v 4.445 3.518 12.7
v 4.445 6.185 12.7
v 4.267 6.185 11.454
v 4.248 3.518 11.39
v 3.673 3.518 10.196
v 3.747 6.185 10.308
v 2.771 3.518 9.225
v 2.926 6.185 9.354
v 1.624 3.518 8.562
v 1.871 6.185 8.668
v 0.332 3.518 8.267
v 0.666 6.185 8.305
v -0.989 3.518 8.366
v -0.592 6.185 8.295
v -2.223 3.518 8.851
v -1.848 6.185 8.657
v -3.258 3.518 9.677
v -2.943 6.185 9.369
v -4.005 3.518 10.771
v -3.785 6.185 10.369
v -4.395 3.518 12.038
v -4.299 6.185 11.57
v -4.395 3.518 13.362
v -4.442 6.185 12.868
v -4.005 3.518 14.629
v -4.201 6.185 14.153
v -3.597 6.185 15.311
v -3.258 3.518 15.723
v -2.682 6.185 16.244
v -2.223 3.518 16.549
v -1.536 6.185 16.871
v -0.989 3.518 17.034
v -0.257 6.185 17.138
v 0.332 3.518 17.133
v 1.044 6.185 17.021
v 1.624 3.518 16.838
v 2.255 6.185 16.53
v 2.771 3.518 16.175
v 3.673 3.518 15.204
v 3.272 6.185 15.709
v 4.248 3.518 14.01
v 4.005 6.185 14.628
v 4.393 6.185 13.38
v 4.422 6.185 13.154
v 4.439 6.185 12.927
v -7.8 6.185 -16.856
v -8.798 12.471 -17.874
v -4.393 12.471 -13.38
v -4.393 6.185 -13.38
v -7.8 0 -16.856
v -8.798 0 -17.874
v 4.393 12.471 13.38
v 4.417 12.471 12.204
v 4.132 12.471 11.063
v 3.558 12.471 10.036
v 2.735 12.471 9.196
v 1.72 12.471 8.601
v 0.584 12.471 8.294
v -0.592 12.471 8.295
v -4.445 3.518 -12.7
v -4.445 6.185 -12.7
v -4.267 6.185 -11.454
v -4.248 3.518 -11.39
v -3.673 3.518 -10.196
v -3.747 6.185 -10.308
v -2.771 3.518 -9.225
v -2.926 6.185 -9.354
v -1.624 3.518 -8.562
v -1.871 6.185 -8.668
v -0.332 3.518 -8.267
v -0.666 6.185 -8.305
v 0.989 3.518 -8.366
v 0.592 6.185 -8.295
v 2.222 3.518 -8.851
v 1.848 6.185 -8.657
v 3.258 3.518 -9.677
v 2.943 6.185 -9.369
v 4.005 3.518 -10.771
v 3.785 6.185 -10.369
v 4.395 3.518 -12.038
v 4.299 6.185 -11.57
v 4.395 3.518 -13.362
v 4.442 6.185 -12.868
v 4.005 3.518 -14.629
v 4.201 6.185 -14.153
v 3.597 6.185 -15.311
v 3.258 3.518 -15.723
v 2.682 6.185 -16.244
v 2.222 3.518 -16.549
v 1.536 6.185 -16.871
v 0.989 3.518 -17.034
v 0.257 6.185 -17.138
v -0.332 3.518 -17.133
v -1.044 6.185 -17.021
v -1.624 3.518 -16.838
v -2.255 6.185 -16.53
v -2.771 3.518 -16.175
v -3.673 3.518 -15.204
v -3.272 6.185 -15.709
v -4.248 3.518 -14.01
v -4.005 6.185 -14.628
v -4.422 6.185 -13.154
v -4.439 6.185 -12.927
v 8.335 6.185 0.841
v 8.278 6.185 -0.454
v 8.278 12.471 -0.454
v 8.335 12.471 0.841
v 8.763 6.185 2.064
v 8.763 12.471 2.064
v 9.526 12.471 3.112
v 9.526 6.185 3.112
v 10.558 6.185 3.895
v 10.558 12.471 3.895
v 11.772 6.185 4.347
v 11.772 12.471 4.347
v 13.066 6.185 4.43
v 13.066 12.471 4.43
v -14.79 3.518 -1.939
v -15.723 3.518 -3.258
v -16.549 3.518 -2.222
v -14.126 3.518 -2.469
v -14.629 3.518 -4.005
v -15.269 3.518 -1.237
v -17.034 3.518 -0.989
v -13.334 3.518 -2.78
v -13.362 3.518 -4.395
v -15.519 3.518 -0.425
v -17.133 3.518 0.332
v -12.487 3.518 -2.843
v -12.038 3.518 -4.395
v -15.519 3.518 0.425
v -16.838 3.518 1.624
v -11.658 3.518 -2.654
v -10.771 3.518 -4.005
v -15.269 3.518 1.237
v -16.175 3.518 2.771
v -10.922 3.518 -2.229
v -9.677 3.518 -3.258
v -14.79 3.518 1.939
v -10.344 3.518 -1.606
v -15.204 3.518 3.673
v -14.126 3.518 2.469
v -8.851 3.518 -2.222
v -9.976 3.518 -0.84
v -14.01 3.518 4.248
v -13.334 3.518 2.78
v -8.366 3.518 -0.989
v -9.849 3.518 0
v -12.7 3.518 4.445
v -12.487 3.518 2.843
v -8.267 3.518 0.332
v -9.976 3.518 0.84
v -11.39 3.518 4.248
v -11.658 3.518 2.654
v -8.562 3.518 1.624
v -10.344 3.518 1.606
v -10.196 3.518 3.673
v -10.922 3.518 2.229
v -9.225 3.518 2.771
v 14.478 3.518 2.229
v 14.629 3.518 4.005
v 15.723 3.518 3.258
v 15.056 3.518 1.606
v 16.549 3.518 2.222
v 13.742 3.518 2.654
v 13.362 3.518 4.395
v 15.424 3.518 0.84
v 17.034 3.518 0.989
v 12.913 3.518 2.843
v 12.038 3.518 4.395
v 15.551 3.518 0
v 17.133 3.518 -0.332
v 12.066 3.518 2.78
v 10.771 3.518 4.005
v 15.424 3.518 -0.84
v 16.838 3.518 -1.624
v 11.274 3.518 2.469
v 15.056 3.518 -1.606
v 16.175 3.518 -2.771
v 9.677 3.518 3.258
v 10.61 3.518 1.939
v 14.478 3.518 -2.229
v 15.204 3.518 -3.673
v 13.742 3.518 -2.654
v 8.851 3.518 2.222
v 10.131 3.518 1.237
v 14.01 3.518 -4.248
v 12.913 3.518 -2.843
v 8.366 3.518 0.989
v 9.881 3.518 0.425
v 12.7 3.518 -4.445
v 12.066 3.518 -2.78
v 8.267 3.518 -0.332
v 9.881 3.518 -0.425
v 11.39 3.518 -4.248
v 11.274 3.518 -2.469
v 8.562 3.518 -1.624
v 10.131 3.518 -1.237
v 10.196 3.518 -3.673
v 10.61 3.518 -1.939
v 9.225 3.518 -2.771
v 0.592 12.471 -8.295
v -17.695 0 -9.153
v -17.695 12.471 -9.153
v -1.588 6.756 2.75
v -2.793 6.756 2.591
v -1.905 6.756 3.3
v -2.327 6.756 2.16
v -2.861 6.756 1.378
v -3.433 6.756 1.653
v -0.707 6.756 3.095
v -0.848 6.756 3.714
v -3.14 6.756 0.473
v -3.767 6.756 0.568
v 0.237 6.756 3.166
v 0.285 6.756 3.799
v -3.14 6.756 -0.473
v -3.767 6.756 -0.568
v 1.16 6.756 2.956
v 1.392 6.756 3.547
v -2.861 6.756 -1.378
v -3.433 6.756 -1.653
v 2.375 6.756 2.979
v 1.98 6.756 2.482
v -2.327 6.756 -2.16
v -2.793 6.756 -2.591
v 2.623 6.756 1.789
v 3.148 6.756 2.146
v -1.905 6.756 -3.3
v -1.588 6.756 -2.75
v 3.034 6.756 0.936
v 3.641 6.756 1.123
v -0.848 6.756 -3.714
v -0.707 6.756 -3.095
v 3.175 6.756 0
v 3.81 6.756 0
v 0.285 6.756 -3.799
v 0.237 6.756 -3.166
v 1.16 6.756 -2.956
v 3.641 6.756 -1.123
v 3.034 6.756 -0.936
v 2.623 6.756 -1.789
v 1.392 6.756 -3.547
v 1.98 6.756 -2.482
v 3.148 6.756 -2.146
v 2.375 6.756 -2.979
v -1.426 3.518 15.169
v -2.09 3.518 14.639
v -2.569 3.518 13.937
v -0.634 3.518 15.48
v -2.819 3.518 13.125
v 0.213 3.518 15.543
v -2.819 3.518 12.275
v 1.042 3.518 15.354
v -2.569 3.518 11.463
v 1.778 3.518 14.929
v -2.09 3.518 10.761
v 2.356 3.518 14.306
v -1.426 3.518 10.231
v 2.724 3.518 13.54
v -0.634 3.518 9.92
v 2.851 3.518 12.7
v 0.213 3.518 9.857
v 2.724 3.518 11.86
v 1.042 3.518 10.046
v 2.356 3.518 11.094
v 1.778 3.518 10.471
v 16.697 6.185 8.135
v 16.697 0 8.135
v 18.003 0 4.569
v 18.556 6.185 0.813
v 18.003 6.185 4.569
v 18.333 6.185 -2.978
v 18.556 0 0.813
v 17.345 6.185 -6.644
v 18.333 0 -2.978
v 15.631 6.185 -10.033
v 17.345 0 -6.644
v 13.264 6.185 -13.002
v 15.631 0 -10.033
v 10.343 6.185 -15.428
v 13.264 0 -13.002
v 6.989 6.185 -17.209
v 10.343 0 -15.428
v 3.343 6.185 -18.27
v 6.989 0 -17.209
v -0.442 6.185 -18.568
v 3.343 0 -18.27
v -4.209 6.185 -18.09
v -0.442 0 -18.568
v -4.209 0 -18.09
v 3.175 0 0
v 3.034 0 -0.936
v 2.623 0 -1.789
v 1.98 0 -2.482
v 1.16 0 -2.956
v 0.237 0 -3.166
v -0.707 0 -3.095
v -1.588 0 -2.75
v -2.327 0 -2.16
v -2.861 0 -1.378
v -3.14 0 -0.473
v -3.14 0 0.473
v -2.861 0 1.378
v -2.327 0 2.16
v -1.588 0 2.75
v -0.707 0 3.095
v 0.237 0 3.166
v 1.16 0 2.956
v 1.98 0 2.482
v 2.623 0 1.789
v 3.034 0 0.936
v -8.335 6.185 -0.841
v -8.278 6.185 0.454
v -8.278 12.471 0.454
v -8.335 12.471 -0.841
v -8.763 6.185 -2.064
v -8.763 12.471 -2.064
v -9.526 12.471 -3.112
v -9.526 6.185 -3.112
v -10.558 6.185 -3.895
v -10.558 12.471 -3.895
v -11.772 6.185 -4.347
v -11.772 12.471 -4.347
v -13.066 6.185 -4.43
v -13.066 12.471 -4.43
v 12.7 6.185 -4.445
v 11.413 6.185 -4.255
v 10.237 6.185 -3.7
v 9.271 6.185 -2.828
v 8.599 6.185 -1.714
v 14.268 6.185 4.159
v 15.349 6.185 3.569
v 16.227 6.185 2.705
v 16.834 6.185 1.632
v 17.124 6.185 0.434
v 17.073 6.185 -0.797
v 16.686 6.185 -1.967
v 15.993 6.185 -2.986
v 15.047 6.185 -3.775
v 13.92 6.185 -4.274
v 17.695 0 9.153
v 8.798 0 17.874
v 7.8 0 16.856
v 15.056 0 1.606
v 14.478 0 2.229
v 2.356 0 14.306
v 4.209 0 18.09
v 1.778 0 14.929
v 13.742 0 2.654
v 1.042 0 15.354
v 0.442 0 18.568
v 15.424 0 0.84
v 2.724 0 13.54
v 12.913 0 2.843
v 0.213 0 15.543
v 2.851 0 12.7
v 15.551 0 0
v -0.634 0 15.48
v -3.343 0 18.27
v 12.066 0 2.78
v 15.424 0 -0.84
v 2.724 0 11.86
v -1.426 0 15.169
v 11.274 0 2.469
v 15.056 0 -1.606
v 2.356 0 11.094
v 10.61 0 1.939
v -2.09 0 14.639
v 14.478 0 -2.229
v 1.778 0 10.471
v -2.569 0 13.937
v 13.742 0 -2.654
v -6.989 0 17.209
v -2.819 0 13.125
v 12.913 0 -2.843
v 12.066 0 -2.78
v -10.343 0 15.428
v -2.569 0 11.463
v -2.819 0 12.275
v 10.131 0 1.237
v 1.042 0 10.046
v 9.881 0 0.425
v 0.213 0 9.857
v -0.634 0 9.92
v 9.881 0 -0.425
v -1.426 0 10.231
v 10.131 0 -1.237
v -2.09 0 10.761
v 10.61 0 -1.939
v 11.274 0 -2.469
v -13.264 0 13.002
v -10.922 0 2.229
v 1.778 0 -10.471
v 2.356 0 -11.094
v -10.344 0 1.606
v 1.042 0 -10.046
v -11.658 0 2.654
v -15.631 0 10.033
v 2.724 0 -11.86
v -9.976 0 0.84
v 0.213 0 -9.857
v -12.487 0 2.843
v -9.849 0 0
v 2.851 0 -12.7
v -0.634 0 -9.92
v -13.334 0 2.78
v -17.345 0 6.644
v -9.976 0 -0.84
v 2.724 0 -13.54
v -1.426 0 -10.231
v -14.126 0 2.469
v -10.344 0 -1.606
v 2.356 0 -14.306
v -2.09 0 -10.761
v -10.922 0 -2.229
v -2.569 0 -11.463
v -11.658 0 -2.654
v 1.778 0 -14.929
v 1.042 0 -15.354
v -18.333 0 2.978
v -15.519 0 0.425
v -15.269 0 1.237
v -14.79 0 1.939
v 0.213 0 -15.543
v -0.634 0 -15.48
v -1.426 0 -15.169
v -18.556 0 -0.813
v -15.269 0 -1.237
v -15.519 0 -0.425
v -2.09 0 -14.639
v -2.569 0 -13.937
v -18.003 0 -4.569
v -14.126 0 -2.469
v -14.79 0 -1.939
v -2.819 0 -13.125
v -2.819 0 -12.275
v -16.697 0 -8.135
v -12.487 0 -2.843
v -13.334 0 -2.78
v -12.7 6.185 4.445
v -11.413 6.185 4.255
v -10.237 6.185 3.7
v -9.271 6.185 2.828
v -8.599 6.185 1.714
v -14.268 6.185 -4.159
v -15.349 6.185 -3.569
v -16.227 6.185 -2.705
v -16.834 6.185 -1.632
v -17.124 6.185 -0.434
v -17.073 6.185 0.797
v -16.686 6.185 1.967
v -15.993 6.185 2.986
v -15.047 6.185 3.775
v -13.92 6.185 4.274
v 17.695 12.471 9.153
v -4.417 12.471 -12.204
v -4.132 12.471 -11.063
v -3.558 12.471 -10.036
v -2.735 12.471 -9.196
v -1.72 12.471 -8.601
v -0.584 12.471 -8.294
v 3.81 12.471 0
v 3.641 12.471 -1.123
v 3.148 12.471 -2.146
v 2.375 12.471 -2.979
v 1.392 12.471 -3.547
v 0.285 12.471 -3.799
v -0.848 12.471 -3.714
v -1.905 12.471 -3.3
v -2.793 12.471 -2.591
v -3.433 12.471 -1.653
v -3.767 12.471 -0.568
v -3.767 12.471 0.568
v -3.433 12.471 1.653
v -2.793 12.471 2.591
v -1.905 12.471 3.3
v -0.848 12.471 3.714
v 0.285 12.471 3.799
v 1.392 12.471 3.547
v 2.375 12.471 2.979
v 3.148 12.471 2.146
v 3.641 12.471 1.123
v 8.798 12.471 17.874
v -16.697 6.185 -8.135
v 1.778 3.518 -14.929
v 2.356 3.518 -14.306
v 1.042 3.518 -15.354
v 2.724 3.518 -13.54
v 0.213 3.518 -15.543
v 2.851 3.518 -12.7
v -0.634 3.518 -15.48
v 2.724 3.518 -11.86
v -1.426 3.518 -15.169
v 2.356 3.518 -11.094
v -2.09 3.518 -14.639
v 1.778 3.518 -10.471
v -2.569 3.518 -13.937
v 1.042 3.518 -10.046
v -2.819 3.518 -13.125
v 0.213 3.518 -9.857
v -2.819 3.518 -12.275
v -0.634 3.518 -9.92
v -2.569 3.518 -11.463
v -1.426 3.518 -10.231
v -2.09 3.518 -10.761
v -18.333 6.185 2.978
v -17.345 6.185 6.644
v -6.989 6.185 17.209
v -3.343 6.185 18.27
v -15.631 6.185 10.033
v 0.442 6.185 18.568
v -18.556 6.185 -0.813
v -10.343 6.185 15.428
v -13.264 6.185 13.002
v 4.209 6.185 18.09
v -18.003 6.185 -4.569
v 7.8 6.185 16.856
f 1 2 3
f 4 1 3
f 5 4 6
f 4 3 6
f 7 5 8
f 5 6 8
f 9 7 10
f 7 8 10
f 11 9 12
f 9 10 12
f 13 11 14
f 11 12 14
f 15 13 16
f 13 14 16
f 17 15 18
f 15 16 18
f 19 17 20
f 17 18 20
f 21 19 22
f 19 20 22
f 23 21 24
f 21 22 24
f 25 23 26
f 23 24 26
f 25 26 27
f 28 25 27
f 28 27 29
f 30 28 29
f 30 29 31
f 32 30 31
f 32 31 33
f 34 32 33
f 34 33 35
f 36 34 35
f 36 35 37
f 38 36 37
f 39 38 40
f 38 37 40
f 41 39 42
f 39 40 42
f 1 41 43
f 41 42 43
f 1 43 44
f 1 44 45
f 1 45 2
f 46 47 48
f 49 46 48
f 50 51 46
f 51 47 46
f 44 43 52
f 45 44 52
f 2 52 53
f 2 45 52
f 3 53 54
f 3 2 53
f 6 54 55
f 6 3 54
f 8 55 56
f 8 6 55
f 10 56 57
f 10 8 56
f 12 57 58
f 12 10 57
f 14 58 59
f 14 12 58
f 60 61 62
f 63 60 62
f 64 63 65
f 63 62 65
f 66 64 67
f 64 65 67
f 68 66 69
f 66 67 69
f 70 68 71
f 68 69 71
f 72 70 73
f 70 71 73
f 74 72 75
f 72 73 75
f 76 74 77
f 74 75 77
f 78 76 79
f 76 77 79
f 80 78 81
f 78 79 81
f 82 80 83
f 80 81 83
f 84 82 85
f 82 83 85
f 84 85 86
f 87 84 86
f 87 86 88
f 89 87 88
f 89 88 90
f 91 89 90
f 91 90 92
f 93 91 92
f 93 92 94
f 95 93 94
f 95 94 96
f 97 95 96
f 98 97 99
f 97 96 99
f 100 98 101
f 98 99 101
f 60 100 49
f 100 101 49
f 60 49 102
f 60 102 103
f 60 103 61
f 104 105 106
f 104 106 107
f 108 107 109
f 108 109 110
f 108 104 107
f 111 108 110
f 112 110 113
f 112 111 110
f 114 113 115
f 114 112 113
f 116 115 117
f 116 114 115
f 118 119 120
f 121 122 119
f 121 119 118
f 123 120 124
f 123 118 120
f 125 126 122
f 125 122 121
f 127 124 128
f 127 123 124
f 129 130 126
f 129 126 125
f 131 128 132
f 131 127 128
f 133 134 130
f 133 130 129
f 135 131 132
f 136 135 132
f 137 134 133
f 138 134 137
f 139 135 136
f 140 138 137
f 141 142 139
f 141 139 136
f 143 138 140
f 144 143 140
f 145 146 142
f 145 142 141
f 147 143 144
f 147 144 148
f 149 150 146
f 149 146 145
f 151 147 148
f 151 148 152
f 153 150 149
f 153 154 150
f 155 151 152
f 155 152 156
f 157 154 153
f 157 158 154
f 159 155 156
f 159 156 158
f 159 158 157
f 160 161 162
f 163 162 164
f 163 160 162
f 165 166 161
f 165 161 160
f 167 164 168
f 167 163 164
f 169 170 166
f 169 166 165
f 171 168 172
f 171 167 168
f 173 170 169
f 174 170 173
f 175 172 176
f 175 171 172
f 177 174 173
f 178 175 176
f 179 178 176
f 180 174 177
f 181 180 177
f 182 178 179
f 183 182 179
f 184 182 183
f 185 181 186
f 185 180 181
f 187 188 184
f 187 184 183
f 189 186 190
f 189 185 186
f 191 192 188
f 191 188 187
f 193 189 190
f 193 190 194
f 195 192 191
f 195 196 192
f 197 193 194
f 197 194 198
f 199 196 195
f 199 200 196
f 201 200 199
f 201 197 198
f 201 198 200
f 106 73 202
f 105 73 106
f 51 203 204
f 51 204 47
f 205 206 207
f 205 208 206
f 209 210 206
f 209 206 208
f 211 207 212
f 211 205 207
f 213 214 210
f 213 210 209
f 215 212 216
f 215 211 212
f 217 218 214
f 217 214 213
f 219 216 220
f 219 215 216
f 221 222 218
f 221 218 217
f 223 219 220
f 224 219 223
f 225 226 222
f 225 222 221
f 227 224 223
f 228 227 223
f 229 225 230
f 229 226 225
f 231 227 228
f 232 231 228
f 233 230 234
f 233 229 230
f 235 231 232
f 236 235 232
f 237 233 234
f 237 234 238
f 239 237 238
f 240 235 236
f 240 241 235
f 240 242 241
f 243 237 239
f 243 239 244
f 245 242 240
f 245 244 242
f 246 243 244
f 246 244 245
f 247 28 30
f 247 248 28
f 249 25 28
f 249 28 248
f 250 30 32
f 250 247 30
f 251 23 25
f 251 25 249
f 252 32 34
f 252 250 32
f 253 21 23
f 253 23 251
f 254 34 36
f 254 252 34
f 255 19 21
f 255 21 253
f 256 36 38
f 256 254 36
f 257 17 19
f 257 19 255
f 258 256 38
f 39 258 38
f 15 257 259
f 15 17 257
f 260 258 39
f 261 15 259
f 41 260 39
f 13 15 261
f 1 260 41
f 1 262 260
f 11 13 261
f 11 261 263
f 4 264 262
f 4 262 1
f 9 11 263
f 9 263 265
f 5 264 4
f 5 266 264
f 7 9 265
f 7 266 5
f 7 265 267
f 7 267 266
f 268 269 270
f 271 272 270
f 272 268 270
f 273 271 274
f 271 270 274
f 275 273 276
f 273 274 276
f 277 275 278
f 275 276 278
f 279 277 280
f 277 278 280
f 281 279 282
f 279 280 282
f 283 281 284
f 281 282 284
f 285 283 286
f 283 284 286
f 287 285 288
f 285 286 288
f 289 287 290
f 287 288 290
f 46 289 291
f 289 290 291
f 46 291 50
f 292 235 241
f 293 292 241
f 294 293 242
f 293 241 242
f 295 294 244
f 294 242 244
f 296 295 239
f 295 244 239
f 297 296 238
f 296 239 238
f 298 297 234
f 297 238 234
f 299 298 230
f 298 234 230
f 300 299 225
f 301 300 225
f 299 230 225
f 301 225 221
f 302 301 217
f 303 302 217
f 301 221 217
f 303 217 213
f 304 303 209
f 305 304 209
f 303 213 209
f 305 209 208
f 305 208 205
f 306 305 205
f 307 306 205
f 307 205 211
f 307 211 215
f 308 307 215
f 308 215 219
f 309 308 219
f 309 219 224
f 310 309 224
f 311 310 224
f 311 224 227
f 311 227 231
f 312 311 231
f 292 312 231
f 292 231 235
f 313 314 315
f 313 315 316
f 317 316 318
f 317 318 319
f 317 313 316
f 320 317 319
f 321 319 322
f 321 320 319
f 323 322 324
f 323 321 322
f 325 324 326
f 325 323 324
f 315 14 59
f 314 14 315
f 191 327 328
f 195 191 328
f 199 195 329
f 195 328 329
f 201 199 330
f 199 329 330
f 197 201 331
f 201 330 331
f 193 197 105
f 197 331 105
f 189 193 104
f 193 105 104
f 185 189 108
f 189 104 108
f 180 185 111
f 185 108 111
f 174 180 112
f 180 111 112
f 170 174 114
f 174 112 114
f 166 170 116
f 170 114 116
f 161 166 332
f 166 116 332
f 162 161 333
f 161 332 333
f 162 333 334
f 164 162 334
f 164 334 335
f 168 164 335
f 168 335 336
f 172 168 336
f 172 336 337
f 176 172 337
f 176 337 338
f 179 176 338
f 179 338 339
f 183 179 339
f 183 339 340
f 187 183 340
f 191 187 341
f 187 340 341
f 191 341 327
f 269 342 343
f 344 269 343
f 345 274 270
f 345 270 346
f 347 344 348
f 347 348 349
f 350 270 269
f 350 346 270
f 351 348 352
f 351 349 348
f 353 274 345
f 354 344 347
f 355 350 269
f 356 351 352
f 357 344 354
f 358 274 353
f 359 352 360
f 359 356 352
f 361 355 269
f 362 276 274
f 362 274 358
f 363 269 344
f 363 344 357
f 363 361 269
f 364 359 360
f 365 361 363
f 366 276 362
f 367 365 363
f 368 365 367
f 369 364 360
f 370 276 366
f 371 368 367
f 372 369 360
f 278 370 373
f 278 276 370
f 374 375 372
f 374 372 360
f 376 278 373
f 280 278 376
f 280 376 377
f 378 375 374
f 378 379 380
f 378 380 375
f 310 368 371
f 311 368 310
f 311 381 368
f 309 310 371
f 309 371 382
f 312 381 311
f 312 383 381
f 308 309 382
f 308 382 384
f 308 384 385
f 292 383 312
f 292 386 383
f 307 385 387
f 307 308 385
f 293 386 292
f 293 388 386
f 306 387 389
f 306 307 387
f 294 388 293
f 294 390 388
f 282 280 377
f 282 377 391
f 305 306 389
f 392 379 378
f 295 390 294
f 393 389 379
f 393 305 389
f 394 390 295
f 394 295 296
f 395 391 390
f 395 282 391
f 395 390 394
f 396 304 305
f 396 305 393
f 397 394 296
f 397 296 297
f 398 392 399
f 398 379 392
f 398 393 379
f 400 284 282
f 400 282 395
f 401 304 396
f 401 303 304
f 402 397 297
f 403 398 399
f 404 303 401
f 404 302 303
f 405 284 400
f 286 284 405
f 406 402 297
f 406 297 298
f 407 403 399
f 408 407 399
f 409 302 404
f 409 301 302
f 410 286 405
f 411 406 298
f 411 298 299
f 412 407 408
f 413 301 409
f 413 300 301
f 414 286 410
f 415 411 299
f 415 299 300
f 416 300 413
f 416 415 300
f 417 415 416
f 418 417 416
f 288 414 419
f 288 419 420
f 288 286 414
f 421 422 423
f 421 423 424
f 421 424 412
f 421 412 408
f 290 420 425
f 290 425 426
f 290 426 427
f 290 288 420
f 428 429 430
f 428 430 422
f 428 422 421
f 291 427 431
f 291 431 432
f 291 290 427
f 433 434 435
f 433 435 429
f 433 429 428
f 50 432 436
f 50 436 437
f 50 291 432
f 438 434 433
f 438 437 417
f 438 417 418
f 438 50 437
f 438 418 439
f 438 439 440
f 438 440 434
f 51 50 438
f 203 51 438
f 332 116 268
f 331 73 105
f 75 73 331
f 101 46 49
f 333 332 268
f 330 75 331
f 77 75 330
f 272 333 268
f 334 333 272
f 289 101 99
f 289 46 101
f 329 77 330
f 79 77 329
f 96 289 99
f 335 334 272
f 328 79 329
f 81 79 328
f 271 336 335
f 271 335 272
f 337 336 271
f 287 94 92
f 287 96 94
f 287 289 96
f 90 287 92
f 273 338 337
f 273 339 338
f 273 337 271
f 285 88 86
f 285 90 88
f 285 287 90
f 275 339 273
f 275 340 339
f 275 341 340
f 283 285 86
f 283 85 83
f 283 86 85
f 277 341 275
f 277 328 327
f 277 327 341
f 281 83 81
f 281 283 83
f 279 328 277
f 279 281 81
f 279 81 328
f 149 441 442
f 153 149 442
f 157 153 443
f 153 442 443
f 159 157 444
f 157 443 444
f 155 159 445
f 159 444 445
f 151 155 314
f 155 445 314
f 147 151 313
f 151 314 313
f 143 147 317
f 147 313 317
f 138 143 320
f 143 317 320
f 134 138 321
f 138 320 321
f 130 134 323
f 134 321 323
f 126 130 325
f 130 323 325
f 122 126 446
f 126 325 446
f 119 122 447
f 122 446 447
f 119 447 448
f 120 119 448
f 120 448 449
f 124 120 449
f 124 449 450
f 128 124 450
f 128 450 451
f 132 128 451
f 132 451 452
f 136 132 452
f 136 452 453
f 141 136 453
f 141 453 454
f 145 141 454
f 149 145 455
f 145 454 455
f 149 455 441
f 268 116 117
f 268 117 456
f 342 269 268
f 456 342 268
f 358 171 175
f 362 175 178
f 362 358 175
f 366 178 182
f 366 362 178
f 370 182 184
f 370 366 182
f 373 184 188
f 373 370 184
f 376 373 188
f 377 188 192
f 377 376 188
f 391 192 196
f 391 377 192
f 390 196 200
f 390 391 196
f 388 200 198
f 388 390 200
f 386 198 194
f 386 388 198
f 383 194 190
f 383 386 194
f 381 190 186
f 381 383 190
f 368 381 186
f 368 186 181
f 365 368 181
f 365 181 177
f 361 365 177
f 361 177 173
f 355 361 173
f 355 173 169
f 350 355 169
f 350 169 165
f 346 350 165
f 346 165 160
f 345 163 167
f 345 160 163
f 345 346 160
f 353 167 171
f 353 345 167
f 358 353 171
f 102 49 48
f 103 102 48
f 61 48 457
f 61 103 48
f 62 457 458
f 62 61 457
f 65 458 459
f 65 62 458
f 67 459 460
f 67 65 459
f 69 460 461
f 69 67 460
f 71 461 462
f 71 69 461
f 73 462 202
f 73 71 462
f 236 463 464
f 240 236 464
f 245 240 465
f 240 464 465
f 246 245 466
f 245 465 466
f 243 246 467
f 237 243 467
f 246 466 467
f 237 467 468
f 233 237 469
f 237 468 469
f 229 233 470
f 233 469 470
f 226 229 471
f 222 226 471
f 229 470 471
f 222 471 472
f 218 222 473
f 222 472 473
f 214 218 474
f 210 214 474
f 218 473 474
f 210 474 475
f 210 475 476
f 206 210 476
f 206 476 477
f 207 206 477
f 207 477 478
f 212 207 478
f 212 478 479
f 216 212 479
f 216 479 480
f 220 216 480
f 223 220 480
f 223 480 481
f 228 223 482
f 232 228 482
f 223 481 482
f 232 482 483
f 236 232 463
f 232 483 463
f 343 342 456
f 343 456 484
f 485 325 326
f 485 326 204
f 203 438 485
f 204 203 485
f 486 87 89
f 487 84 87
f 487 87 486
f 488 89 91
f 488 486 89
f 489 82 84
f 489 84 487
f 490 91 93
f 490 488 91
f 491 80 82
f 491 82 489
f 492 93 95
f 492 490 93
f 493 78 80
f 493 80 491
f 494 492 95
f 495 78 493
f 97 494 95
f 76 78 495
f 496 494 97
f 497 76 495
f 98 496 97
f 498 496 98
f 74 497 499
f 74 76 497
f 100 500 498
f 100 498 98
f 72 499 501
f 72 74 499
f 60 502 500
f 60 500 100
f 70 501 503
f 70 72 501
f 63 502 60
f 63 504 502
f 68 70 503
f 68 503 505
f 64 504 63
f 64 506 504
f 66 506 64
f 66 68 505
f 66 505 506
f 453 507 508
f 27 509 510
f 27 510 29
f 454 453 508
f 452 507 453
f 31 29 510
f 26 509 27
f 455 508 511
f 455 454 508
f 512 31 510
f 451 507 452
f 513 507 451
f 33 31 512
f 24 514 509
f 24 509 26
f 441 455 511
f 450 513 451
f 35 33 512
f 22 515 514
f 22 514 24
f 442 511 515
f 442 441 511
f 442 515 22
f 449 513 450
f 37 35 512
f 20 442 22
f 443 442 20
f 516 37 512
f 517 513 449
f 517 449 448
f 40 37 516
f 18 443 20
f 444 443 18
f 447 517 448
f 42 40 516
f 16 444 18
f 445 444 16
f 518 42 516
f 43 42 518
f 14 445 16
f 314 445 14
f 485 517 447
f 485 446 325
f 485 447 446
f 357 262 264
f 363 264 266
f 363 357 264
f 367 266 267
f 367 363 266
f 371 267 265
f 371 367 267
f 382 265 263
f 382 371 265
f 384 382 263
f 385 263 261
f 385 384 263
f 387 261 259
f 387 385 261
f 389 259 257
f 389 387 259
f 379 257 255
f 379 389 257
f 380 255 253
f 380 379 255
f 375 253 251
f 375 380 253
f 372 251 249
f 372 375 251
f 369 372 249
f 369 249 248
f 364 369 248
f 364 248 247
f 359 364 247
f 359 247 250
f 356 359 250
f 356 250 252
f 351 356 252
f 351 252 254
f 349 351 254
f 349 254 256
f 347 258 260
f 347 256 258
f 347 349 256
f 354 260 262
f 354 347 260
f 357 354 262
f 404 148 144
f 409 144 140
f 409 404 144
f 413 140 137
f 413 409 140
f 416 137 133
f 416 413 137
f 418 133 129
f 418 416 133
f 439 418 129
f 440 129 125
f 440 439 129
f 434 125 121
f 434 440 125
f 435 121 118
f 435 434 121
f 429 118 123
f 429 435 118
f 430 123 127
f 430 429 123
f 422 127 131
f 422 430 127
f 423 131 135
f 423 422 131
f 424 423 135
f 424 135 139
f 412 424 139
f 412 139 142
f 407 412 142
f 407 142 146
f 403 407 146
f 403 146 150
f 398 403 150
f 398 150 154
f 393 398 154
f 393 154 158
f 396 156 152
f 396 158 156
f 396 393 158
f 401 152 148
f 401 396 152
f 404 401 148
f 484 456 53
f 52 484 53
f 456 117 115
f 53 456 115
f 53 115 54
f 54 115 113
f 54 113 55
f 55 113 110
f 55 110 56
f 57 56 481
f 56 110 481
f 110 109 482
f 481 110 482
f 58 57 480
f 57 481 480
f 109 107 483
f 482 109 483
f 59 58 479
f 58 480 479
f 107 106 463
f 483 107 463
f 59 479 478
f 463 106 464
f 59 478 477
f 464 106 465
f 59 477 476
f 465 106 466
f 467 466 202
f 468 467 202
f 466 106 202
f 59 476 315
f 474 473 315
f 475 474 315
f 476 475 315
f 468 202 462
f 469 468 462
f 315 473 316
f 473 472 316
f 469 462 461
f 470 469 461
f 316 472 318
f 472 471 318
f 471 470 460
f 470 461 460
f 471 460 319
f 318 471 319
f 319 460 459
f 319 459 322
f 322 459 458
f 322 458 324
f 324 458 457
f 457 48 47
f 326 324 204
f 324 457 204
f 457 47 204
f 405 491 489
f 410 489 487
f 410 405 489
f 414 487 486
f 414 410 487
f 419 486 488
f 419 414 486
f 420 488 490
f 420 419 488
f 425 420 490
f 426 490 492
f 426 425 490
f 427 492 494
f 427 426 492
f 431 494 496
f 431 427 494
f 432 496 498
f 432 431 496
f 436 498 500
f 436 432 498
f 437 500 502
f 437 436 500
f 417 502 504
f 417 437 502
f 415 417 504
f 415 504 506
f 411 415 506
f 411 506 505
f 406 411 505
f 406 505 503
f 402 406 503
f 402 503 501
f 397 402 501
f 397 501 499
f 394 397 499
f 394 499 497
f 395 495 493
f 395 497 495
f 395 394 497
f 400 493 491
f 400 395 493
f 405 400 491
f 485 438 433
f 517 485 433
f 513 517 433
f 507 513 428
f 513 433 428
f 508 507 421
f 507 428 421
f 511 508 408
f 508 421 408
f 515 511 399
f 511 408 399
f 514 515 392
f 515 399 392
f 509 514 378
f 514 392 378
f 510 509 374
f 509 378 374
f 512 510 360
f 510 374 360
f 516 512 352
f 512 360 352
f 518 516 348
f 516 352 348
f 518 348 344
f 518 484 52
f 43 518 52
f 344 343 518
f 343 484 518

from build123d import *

# Parameters (mm, degrees)
SKETCH1_R           = 18.57375
SKETCH1_R_2         = 2.85115
BOSS_EXTRUDE1_DEPTH = 6.1849
BOSS_EXTRUDE2_DEPTH = 12.4714
SKETCH3_R           = 4.445
CUT_EXTRUDE1_DEPTH  = 2.667
CIRPATTERN1_COUNT   = 4
SKETCH4_R           = 3.81
CUT_EXTRUDE2_DEPTH  = 5.715
SKETCH5_R           = 3.175
CUT_EXTRUDE3_DEPTH  = 7.7564


with BuildPart() as part:
    # Sketch1 → Boss-Extrude1 (new body)
    with BuildSketch(Plane(origin=(0, 0, 0), x_dir=(1, 0, 0), z_dir=(0, 1, 0))):
        Circle(SKETCH1_R)
        with Locations((0, 12.7)):
            Circle(SKETCH1_R_2, mode=Mode.SUBTRACT)
        with Locations((-12.7, 0)):
            Circle(SKETCH1_R_2, mode=Mode.SUBTRACT)
        with Locations((0, -12.7)):
            Circle(SKETCH1_R_2, mode=Mode.SUBTRACT)
        with Locations((12.7, 0)):
            Circle(SKETCH1_R_2, mode=Mode.SUBTRACT)
    extrude(amount=BOSS_EXTRUDE1_DEPTH)

    # Sketch2 → Boss-Extrude2 (add)
    with BuildSketch(Plane(origin=(0, 0, 0), x_dir=(1, 0, 0), z_dir=(0, 1, 0))):
        with BuildLine():
            Line((-8.797939445, 17.874031217), (-4.392677204, 13.380008809))
            ThreePointArc((-4.392677204, 13.380008809), (-3.174280479, 9.588413838), (0.592258402, 8.294633388))
            Line((0.592258402, 8.294633388), (8.278225813, 0.453803969))
            ThreePointArc((8.278225813, 0.453803969), (9.525719521, -3.111586162), (13.065518202, -4.429945987))
            Line((13.065518202, -4.429945987), (17.694994159, -9.152699719))
            Line((17.694994159, -9.152699719), (8.797939445, -17.874031217))
            Line((8.797939445, -17.874031217), (4.392677204, -13.380008809))
            ThreePointArc((4.392677204, -13.380008809), (3.174280479, -9.588413838), (-0.592258402, -8.294633388))
            Line((-0.592258402, -8.294633388), (-8.278225813, -0.453803969))
            ThreePointArc((-8.278225813, -0.453803969), (-9.525719521, 3.111586162), (-13.065518202, 4.429945987))
            Line((-13.065518202, 4.429945987), (-17.694994159, 9.152699719))
            Line((-17.694994159, 9.152699719), (-8.797939445, 17.874031217))
        make_face()
    extrude(amount=BOSS_EXTRUDE2_DEPTH)

    # Sketch3 → Cut-Extrude1 (cut)
    with BuildSketch(Plane(origin=(0, 6.1849, 0), x_dir=(1, 0, 0), z_dir=(0, 1, 0))):
        with Locations((0, -12.7)):
            Circle(SKETCH3_R)
    cut_extrude1 = extrude(amount=-CUT_EXTRUDE1_DEPTH, mode=Mode.SUBTRACT)

    # CirPattern1: Cut-Extrude1 ×4 about axis
    cirpattern1_axis = Axis((0, 6.1849, 0), (0, -1, 0))
    for i in range(1, CIRPATTERN1_COUNT):
        add(cut_extrude1.rotate(cirpattern1_axis, i * 360 / CIRPATTERN1_COUNT), mode=Mode.SUBTRACT)

    # Sketch4 → Cut-Extrude2 (cut)
    with BuildSketch(Plane(origin=(0, 12.4714, 0), x_dir=(1, 0, 0), z_dir=(0, 1, 0))):
        Circle(SKETCH4_R)
    extrude(amount=-CUT_EXTRUDE2_DEPTH, mode=Mode.SUBTRACT)

    # Sketch5 → Cut-Extrude3 (cut, through all)
    with BuildSketch(Plane(origin=(0, 6.7564, 0), x_dir=(1, 0, 0), z_dir=(0, 1, 0))):
        Circle(SKETCH5_R)
    extrude(amount=-CUT_EXTRUDE3_DEPTH, mode=Mode.SUBTRACT)


solid = part.part
